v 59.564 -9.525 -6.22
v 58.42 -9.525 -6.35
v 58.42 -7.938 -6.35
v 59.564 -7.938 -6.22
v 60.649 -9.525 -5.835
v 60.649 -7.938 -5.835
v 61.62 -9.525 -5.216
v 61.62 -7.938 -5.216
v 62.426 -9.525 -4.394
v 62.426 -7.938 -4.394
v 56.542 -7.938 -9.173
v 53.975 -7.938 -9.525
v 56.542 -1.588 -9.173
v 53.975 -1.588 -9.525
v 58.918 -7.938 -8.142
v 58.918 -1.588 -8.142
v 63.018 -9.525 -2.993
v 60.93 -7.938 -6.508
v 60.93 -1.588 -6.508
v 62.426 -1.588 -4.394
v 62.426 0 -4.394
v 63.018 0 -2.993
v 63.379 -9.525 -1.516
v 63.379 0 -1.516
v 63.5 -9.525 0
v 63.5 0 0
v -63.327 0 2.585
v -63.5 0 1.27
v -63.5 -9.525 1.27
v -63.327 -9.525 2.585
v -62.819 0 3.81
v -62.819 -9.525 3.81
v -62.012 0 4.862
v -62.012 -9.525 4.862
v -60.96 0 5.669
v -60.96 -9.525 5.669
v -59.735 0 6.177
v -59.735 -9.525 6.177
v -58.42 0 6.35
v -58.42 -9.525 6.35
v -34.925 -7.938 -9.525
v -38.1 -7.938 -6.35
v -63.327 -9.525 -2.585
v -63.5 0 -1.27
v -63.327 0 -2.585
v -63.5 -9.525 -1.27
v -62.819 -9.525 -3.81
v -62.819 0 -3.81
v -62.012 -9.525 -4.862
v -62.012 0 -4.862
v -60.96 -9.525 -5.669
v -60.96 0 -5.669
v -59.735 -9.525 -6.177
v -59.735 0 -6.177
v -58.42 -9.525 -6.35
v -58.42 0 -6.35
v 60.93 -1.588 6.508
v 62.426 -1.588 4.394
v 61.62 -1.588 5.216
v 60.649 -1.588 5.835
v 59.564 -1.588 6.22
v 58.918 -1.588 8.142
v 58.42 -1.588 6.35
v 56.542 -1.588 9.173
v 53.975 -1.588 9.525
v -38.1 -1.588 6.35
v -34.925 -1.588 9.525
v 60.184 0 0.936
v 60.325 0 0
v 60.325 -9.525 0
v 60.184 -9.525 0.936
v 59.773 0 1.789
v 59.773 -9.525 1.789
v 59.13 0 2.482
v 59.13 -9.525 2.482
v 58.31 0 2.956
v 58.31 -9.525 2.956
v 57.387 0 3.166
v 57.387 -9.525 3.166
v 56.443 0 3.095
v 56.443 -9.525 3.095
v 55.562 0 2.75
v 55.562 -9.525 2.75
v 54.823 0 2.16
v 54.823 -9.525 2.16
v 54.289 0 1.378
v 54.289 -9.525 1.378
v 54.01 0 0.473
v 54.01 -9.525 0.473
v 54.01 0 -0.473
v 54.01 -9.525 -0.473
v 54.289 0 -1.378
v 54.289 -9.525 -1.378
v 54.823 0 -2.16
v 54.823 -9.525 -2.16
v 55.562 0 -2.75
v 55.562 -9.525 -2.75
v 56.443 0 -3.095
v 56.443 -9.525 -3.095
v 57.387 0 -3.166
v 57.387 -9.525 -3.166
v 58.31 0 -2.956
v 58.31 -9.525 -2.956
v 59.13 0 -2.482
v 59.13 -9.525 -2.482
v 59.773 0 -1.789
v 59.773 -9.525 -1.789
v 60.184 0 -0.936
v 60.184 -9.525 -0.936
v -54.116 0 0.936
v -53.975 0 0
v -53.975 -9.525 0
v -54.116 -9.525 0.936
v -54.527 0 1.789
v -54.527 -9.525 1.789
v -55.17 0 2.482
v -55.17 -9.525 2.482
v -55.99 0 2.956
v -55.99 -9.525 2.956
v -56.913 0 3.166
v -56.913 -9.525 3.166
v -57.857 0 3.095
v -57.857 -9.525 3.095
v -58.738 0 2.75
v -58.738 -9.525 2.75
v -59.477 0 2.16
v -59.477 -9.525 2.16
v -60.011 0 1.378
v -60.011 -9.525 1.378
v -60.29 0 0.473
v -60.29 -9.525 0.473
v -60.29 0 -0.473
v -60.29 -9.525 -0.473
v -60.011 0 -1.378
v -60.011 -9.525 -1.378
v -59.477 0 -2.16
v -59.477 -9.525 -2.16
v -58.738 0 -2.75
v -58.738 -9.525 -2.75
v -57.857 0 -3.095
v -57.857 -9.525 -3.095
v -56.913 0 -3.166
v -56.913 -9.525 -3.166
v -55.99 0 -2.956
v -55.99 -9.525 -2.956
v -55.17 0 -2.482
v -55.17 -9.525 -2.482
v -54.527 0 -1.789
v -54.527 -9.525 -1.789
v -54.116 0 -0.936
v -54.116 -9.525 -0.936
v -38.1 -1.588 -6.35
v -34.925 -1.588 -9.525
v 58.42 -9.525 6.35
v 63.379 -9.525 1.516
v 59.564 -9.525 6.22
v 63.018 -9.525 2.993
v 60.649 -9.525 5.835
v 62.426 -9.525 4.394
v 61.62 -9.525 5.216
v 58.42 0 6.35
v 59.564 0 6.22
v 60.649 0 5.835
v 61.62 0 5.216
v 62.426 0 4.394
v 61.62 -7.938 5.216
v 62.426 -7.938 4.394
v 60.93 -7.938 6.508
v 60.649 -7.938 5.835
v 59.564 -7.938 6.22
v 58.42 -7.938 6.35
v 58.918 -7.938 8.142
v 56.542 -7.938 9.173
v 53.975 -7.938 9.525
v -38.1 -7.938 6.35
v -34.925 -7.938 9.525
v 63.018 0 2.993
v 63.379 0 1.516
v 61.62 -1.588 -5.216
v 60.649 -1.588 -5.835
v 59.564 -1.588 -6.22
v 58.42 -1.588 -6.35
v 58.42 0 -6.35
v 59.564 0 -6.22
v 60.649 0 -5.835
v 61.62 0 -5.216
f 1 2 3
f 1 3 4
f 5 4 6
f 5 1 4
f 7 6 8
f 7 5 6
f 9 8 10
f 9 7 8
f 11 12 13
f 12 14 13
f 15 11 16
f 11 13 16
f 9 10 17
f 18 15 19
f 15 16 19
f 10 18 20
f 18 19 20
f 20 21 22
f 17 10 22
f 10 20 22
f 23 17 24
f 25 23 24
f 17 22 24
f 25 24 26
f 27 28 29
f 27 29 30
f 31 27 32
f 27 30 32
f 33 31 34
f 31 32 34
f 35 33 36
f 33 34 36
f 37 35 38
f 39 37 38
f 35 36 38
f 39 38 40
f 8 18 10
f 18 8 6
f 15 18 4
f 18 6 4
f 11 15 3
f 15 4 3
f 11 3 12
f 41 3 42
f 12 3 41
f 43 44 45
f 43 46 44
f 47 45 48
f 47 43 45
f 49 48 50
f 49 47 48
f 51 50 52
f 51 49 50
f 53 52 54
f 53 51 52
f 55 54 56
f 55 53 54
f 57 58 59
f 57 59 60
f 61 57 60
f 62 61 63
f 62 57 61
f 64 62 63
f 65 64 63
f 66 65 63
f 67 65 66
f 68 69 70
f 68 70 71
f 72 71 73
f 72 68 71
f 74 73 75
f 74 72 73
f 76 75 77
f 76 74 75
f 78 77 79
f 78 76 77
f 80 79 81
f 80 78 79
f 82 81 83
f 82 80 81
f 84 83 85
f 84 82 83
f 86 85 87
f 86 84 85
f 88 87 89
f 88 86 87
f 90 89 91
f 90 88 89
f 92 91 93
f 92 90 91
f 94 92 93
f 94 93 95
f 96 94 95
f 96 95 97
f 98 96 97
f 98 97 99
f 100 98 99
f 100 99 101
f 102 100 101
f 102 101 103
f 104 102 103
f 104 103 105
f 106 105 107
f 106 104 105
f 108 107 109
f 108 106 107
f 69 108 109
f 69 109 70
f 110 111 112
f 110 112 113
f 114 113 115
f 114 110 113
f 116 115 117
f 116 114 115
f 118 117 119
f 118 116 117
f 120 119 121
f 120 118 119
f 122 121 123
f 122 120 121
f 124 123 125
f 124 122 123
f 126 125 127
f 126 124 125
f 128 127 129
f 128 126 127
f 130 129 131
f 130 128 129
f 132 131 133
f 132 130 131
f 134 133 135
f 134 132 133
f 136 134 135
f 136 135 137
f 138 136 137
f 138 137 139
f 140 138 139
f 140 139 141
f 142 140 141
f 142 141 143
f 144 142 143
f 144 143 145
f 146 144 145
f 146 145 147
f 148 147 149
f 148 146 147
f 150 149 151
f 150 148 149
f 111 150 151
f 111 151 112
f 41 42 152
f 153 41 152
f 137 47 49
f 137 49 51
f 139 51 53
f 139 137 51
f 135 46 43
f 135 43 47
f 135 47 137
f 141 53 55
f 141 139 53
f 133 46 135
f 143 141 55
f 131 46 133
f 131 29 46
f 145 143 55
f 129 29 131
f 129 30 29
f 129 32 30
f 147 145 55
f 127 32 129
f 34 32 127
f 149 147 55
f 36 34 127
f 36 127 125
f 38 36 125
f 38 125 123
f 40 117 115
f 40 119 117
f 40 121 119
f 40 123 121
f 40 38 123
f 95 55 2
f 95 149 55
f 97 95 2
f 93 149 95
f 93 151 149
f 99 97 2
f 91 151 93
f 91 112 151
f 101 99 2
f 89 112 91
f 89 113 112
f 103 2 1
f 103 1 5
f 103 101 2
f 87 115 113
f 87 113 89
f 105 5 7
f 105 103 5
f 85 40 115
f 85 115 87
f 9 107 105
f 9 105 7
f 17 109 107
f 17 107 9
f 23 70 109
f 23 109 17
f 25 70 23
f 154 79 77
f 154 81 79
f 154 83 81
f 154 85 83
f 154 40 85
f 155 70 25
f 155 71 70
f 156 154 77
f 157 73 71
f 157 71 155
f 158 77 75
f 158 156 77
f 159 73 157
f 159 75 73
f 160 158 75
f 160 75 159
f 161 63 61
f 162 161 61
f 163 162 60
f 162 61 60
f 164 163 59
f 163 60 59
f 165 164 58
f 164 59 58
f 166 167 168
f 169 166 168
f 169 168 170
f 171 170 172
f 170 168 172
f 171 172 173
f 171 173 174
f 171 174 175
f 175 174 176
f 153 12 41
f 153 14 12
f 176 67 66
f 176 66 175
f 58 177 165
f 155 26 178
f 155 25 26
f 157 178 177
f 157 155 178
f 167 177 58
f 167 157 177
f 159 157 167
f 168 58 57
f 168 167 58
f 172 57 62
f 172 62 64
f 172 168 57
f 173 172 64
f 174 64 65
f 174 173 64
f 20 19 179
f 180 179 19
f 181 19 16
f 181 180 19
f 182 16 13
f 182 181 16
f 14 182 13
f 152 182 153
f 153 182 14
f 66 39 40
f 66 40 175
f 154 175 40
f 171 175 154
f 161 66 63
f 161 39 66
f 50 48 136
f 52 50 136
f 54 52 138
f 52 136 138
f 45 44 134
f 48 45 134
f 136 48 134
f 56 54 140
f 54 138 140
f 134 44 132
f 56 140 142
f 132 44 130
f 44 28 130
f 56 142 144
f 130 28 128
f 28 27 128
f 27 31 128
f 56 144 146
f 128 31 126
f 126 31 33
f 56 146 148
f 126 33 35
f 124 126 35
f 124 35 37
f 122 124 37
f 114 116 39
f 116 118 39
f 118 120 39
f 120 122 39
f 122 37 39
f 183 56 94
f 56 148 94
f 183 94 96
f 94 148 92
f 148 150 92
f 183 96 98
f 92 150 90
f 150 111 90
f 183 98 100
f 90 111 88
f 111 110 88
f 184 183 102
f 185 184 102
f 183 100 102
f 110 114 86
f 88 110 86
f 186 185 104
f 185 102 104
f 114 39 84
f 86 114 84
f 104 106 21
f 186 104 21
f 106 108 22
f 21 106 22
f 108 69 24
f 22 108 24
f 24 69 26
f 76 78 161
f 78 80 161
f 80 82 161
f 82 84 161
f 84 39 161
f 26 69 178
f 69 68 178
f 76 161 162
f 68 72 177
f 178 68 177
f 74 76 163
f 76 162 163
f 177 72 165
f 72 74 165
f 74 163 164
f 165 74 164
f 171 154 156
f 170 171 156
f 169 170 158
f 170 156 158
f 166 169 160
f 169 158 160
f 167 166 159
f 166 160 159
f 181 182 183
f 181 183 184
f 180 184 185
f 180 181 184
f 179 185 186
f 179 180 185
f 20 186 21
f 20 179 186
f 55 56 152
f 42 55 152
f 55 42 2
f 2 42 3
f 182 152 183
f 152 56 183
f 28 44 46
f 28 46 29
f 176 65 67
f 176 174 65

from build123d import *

# Parameters (mm, degrees)
F0_W          = 127
F0_H          = 12.7
F0_R          = 3.175
F1_DEPTH      = 9.525
F2_R          = 5.08
F5_W          = 101.6
F5_H          = 19.05
F6_DEPTH      = 3.175
F6_DEPTH_BACK = 3.175
F7_SIZE       = 3.17499
F8_R          = 9.52499


# Not quite as in the source:
# - a fillet or chamfer is up to 0.001 mm smaller than in the source, because OpenCascade refuses the exact size


with BuildPart() as f1:
    # F0 (on Front) → F1 (new body)
    with BuildSketch(Plane.XZ):
        Rectangle(F0_W, F0_H)
        with Locations((-57.15, 0)):
            Circle(F0_R, mode=Mode.SUBTRACT)
        with Locations((57.15, 0)):
            Circle(F0_R, mode=Mode.SUBTRACT)
    extrude(amount=F1_DEPTH)

    # F2
    f2_edges = [f1.edges().sort_by_distance(p)[0] for p in [
        (-63.5, -4.7625, 6.35),
        (-63.5, -4.7625, -6.35),
        (63.5, -4.7625, 6.35),
        (63.5, -4.7625, -6.35),
    ]]
    fillet(f2_edges, radius=F2_R)

    # F5 (on face) → F6 (join, two sides)
    with BuildSketch(Plane(origin=(0, -4.7625, 0), x_dir=(-1, 0, 0), z_dir=(0, 1, 0))) as f6_sk:
        with Locations((-12.7, 0)):
            Rectangle(F5_W, F5_H)
        with BuildLine():
            ThreePointArc((-57.1005828679, 4.1822632775), (-52.9233760572, 0.0930895553), (-57.0553988218, -4.0417364798))
            ThreePointArc((-57.0553988218, -4.0417364798), (-61.2736674525, 0.0472116417), (-57.1005828679, 4.1822632775))
        make_face(mode=Mode.SUBTRACT)
    extrude(amount=F6_DEPTH)
    extrude(f6_sk.sketch, amount=-F6_DEPTH_BACK)

    # F7 (size 3.175 in the source; OpenCascade refuses exactly that, so slightly less here)
    f7_edges = [f1.edges().sort_by_distance(p)[0] for p in [
        (-38.1, -4.7625, 9.525),
        (-38.1, -4.7625, -9.525),
    ]]
    chamfer(f7_edges, length=F7_SIZE)

    # F8 (radius 9.525 in the source; OpenCascade refuses exactly that, so slightly less here)
    f8_edges = [f1.edges().sort_by_distance(p)[0] for p in [
        (63.5, -4.7625, 9.525),
        (63.5, -4.7625, -9.525),
    ]]
    fillet(f8_edges, radius=F8_R)


solid = f1.part
